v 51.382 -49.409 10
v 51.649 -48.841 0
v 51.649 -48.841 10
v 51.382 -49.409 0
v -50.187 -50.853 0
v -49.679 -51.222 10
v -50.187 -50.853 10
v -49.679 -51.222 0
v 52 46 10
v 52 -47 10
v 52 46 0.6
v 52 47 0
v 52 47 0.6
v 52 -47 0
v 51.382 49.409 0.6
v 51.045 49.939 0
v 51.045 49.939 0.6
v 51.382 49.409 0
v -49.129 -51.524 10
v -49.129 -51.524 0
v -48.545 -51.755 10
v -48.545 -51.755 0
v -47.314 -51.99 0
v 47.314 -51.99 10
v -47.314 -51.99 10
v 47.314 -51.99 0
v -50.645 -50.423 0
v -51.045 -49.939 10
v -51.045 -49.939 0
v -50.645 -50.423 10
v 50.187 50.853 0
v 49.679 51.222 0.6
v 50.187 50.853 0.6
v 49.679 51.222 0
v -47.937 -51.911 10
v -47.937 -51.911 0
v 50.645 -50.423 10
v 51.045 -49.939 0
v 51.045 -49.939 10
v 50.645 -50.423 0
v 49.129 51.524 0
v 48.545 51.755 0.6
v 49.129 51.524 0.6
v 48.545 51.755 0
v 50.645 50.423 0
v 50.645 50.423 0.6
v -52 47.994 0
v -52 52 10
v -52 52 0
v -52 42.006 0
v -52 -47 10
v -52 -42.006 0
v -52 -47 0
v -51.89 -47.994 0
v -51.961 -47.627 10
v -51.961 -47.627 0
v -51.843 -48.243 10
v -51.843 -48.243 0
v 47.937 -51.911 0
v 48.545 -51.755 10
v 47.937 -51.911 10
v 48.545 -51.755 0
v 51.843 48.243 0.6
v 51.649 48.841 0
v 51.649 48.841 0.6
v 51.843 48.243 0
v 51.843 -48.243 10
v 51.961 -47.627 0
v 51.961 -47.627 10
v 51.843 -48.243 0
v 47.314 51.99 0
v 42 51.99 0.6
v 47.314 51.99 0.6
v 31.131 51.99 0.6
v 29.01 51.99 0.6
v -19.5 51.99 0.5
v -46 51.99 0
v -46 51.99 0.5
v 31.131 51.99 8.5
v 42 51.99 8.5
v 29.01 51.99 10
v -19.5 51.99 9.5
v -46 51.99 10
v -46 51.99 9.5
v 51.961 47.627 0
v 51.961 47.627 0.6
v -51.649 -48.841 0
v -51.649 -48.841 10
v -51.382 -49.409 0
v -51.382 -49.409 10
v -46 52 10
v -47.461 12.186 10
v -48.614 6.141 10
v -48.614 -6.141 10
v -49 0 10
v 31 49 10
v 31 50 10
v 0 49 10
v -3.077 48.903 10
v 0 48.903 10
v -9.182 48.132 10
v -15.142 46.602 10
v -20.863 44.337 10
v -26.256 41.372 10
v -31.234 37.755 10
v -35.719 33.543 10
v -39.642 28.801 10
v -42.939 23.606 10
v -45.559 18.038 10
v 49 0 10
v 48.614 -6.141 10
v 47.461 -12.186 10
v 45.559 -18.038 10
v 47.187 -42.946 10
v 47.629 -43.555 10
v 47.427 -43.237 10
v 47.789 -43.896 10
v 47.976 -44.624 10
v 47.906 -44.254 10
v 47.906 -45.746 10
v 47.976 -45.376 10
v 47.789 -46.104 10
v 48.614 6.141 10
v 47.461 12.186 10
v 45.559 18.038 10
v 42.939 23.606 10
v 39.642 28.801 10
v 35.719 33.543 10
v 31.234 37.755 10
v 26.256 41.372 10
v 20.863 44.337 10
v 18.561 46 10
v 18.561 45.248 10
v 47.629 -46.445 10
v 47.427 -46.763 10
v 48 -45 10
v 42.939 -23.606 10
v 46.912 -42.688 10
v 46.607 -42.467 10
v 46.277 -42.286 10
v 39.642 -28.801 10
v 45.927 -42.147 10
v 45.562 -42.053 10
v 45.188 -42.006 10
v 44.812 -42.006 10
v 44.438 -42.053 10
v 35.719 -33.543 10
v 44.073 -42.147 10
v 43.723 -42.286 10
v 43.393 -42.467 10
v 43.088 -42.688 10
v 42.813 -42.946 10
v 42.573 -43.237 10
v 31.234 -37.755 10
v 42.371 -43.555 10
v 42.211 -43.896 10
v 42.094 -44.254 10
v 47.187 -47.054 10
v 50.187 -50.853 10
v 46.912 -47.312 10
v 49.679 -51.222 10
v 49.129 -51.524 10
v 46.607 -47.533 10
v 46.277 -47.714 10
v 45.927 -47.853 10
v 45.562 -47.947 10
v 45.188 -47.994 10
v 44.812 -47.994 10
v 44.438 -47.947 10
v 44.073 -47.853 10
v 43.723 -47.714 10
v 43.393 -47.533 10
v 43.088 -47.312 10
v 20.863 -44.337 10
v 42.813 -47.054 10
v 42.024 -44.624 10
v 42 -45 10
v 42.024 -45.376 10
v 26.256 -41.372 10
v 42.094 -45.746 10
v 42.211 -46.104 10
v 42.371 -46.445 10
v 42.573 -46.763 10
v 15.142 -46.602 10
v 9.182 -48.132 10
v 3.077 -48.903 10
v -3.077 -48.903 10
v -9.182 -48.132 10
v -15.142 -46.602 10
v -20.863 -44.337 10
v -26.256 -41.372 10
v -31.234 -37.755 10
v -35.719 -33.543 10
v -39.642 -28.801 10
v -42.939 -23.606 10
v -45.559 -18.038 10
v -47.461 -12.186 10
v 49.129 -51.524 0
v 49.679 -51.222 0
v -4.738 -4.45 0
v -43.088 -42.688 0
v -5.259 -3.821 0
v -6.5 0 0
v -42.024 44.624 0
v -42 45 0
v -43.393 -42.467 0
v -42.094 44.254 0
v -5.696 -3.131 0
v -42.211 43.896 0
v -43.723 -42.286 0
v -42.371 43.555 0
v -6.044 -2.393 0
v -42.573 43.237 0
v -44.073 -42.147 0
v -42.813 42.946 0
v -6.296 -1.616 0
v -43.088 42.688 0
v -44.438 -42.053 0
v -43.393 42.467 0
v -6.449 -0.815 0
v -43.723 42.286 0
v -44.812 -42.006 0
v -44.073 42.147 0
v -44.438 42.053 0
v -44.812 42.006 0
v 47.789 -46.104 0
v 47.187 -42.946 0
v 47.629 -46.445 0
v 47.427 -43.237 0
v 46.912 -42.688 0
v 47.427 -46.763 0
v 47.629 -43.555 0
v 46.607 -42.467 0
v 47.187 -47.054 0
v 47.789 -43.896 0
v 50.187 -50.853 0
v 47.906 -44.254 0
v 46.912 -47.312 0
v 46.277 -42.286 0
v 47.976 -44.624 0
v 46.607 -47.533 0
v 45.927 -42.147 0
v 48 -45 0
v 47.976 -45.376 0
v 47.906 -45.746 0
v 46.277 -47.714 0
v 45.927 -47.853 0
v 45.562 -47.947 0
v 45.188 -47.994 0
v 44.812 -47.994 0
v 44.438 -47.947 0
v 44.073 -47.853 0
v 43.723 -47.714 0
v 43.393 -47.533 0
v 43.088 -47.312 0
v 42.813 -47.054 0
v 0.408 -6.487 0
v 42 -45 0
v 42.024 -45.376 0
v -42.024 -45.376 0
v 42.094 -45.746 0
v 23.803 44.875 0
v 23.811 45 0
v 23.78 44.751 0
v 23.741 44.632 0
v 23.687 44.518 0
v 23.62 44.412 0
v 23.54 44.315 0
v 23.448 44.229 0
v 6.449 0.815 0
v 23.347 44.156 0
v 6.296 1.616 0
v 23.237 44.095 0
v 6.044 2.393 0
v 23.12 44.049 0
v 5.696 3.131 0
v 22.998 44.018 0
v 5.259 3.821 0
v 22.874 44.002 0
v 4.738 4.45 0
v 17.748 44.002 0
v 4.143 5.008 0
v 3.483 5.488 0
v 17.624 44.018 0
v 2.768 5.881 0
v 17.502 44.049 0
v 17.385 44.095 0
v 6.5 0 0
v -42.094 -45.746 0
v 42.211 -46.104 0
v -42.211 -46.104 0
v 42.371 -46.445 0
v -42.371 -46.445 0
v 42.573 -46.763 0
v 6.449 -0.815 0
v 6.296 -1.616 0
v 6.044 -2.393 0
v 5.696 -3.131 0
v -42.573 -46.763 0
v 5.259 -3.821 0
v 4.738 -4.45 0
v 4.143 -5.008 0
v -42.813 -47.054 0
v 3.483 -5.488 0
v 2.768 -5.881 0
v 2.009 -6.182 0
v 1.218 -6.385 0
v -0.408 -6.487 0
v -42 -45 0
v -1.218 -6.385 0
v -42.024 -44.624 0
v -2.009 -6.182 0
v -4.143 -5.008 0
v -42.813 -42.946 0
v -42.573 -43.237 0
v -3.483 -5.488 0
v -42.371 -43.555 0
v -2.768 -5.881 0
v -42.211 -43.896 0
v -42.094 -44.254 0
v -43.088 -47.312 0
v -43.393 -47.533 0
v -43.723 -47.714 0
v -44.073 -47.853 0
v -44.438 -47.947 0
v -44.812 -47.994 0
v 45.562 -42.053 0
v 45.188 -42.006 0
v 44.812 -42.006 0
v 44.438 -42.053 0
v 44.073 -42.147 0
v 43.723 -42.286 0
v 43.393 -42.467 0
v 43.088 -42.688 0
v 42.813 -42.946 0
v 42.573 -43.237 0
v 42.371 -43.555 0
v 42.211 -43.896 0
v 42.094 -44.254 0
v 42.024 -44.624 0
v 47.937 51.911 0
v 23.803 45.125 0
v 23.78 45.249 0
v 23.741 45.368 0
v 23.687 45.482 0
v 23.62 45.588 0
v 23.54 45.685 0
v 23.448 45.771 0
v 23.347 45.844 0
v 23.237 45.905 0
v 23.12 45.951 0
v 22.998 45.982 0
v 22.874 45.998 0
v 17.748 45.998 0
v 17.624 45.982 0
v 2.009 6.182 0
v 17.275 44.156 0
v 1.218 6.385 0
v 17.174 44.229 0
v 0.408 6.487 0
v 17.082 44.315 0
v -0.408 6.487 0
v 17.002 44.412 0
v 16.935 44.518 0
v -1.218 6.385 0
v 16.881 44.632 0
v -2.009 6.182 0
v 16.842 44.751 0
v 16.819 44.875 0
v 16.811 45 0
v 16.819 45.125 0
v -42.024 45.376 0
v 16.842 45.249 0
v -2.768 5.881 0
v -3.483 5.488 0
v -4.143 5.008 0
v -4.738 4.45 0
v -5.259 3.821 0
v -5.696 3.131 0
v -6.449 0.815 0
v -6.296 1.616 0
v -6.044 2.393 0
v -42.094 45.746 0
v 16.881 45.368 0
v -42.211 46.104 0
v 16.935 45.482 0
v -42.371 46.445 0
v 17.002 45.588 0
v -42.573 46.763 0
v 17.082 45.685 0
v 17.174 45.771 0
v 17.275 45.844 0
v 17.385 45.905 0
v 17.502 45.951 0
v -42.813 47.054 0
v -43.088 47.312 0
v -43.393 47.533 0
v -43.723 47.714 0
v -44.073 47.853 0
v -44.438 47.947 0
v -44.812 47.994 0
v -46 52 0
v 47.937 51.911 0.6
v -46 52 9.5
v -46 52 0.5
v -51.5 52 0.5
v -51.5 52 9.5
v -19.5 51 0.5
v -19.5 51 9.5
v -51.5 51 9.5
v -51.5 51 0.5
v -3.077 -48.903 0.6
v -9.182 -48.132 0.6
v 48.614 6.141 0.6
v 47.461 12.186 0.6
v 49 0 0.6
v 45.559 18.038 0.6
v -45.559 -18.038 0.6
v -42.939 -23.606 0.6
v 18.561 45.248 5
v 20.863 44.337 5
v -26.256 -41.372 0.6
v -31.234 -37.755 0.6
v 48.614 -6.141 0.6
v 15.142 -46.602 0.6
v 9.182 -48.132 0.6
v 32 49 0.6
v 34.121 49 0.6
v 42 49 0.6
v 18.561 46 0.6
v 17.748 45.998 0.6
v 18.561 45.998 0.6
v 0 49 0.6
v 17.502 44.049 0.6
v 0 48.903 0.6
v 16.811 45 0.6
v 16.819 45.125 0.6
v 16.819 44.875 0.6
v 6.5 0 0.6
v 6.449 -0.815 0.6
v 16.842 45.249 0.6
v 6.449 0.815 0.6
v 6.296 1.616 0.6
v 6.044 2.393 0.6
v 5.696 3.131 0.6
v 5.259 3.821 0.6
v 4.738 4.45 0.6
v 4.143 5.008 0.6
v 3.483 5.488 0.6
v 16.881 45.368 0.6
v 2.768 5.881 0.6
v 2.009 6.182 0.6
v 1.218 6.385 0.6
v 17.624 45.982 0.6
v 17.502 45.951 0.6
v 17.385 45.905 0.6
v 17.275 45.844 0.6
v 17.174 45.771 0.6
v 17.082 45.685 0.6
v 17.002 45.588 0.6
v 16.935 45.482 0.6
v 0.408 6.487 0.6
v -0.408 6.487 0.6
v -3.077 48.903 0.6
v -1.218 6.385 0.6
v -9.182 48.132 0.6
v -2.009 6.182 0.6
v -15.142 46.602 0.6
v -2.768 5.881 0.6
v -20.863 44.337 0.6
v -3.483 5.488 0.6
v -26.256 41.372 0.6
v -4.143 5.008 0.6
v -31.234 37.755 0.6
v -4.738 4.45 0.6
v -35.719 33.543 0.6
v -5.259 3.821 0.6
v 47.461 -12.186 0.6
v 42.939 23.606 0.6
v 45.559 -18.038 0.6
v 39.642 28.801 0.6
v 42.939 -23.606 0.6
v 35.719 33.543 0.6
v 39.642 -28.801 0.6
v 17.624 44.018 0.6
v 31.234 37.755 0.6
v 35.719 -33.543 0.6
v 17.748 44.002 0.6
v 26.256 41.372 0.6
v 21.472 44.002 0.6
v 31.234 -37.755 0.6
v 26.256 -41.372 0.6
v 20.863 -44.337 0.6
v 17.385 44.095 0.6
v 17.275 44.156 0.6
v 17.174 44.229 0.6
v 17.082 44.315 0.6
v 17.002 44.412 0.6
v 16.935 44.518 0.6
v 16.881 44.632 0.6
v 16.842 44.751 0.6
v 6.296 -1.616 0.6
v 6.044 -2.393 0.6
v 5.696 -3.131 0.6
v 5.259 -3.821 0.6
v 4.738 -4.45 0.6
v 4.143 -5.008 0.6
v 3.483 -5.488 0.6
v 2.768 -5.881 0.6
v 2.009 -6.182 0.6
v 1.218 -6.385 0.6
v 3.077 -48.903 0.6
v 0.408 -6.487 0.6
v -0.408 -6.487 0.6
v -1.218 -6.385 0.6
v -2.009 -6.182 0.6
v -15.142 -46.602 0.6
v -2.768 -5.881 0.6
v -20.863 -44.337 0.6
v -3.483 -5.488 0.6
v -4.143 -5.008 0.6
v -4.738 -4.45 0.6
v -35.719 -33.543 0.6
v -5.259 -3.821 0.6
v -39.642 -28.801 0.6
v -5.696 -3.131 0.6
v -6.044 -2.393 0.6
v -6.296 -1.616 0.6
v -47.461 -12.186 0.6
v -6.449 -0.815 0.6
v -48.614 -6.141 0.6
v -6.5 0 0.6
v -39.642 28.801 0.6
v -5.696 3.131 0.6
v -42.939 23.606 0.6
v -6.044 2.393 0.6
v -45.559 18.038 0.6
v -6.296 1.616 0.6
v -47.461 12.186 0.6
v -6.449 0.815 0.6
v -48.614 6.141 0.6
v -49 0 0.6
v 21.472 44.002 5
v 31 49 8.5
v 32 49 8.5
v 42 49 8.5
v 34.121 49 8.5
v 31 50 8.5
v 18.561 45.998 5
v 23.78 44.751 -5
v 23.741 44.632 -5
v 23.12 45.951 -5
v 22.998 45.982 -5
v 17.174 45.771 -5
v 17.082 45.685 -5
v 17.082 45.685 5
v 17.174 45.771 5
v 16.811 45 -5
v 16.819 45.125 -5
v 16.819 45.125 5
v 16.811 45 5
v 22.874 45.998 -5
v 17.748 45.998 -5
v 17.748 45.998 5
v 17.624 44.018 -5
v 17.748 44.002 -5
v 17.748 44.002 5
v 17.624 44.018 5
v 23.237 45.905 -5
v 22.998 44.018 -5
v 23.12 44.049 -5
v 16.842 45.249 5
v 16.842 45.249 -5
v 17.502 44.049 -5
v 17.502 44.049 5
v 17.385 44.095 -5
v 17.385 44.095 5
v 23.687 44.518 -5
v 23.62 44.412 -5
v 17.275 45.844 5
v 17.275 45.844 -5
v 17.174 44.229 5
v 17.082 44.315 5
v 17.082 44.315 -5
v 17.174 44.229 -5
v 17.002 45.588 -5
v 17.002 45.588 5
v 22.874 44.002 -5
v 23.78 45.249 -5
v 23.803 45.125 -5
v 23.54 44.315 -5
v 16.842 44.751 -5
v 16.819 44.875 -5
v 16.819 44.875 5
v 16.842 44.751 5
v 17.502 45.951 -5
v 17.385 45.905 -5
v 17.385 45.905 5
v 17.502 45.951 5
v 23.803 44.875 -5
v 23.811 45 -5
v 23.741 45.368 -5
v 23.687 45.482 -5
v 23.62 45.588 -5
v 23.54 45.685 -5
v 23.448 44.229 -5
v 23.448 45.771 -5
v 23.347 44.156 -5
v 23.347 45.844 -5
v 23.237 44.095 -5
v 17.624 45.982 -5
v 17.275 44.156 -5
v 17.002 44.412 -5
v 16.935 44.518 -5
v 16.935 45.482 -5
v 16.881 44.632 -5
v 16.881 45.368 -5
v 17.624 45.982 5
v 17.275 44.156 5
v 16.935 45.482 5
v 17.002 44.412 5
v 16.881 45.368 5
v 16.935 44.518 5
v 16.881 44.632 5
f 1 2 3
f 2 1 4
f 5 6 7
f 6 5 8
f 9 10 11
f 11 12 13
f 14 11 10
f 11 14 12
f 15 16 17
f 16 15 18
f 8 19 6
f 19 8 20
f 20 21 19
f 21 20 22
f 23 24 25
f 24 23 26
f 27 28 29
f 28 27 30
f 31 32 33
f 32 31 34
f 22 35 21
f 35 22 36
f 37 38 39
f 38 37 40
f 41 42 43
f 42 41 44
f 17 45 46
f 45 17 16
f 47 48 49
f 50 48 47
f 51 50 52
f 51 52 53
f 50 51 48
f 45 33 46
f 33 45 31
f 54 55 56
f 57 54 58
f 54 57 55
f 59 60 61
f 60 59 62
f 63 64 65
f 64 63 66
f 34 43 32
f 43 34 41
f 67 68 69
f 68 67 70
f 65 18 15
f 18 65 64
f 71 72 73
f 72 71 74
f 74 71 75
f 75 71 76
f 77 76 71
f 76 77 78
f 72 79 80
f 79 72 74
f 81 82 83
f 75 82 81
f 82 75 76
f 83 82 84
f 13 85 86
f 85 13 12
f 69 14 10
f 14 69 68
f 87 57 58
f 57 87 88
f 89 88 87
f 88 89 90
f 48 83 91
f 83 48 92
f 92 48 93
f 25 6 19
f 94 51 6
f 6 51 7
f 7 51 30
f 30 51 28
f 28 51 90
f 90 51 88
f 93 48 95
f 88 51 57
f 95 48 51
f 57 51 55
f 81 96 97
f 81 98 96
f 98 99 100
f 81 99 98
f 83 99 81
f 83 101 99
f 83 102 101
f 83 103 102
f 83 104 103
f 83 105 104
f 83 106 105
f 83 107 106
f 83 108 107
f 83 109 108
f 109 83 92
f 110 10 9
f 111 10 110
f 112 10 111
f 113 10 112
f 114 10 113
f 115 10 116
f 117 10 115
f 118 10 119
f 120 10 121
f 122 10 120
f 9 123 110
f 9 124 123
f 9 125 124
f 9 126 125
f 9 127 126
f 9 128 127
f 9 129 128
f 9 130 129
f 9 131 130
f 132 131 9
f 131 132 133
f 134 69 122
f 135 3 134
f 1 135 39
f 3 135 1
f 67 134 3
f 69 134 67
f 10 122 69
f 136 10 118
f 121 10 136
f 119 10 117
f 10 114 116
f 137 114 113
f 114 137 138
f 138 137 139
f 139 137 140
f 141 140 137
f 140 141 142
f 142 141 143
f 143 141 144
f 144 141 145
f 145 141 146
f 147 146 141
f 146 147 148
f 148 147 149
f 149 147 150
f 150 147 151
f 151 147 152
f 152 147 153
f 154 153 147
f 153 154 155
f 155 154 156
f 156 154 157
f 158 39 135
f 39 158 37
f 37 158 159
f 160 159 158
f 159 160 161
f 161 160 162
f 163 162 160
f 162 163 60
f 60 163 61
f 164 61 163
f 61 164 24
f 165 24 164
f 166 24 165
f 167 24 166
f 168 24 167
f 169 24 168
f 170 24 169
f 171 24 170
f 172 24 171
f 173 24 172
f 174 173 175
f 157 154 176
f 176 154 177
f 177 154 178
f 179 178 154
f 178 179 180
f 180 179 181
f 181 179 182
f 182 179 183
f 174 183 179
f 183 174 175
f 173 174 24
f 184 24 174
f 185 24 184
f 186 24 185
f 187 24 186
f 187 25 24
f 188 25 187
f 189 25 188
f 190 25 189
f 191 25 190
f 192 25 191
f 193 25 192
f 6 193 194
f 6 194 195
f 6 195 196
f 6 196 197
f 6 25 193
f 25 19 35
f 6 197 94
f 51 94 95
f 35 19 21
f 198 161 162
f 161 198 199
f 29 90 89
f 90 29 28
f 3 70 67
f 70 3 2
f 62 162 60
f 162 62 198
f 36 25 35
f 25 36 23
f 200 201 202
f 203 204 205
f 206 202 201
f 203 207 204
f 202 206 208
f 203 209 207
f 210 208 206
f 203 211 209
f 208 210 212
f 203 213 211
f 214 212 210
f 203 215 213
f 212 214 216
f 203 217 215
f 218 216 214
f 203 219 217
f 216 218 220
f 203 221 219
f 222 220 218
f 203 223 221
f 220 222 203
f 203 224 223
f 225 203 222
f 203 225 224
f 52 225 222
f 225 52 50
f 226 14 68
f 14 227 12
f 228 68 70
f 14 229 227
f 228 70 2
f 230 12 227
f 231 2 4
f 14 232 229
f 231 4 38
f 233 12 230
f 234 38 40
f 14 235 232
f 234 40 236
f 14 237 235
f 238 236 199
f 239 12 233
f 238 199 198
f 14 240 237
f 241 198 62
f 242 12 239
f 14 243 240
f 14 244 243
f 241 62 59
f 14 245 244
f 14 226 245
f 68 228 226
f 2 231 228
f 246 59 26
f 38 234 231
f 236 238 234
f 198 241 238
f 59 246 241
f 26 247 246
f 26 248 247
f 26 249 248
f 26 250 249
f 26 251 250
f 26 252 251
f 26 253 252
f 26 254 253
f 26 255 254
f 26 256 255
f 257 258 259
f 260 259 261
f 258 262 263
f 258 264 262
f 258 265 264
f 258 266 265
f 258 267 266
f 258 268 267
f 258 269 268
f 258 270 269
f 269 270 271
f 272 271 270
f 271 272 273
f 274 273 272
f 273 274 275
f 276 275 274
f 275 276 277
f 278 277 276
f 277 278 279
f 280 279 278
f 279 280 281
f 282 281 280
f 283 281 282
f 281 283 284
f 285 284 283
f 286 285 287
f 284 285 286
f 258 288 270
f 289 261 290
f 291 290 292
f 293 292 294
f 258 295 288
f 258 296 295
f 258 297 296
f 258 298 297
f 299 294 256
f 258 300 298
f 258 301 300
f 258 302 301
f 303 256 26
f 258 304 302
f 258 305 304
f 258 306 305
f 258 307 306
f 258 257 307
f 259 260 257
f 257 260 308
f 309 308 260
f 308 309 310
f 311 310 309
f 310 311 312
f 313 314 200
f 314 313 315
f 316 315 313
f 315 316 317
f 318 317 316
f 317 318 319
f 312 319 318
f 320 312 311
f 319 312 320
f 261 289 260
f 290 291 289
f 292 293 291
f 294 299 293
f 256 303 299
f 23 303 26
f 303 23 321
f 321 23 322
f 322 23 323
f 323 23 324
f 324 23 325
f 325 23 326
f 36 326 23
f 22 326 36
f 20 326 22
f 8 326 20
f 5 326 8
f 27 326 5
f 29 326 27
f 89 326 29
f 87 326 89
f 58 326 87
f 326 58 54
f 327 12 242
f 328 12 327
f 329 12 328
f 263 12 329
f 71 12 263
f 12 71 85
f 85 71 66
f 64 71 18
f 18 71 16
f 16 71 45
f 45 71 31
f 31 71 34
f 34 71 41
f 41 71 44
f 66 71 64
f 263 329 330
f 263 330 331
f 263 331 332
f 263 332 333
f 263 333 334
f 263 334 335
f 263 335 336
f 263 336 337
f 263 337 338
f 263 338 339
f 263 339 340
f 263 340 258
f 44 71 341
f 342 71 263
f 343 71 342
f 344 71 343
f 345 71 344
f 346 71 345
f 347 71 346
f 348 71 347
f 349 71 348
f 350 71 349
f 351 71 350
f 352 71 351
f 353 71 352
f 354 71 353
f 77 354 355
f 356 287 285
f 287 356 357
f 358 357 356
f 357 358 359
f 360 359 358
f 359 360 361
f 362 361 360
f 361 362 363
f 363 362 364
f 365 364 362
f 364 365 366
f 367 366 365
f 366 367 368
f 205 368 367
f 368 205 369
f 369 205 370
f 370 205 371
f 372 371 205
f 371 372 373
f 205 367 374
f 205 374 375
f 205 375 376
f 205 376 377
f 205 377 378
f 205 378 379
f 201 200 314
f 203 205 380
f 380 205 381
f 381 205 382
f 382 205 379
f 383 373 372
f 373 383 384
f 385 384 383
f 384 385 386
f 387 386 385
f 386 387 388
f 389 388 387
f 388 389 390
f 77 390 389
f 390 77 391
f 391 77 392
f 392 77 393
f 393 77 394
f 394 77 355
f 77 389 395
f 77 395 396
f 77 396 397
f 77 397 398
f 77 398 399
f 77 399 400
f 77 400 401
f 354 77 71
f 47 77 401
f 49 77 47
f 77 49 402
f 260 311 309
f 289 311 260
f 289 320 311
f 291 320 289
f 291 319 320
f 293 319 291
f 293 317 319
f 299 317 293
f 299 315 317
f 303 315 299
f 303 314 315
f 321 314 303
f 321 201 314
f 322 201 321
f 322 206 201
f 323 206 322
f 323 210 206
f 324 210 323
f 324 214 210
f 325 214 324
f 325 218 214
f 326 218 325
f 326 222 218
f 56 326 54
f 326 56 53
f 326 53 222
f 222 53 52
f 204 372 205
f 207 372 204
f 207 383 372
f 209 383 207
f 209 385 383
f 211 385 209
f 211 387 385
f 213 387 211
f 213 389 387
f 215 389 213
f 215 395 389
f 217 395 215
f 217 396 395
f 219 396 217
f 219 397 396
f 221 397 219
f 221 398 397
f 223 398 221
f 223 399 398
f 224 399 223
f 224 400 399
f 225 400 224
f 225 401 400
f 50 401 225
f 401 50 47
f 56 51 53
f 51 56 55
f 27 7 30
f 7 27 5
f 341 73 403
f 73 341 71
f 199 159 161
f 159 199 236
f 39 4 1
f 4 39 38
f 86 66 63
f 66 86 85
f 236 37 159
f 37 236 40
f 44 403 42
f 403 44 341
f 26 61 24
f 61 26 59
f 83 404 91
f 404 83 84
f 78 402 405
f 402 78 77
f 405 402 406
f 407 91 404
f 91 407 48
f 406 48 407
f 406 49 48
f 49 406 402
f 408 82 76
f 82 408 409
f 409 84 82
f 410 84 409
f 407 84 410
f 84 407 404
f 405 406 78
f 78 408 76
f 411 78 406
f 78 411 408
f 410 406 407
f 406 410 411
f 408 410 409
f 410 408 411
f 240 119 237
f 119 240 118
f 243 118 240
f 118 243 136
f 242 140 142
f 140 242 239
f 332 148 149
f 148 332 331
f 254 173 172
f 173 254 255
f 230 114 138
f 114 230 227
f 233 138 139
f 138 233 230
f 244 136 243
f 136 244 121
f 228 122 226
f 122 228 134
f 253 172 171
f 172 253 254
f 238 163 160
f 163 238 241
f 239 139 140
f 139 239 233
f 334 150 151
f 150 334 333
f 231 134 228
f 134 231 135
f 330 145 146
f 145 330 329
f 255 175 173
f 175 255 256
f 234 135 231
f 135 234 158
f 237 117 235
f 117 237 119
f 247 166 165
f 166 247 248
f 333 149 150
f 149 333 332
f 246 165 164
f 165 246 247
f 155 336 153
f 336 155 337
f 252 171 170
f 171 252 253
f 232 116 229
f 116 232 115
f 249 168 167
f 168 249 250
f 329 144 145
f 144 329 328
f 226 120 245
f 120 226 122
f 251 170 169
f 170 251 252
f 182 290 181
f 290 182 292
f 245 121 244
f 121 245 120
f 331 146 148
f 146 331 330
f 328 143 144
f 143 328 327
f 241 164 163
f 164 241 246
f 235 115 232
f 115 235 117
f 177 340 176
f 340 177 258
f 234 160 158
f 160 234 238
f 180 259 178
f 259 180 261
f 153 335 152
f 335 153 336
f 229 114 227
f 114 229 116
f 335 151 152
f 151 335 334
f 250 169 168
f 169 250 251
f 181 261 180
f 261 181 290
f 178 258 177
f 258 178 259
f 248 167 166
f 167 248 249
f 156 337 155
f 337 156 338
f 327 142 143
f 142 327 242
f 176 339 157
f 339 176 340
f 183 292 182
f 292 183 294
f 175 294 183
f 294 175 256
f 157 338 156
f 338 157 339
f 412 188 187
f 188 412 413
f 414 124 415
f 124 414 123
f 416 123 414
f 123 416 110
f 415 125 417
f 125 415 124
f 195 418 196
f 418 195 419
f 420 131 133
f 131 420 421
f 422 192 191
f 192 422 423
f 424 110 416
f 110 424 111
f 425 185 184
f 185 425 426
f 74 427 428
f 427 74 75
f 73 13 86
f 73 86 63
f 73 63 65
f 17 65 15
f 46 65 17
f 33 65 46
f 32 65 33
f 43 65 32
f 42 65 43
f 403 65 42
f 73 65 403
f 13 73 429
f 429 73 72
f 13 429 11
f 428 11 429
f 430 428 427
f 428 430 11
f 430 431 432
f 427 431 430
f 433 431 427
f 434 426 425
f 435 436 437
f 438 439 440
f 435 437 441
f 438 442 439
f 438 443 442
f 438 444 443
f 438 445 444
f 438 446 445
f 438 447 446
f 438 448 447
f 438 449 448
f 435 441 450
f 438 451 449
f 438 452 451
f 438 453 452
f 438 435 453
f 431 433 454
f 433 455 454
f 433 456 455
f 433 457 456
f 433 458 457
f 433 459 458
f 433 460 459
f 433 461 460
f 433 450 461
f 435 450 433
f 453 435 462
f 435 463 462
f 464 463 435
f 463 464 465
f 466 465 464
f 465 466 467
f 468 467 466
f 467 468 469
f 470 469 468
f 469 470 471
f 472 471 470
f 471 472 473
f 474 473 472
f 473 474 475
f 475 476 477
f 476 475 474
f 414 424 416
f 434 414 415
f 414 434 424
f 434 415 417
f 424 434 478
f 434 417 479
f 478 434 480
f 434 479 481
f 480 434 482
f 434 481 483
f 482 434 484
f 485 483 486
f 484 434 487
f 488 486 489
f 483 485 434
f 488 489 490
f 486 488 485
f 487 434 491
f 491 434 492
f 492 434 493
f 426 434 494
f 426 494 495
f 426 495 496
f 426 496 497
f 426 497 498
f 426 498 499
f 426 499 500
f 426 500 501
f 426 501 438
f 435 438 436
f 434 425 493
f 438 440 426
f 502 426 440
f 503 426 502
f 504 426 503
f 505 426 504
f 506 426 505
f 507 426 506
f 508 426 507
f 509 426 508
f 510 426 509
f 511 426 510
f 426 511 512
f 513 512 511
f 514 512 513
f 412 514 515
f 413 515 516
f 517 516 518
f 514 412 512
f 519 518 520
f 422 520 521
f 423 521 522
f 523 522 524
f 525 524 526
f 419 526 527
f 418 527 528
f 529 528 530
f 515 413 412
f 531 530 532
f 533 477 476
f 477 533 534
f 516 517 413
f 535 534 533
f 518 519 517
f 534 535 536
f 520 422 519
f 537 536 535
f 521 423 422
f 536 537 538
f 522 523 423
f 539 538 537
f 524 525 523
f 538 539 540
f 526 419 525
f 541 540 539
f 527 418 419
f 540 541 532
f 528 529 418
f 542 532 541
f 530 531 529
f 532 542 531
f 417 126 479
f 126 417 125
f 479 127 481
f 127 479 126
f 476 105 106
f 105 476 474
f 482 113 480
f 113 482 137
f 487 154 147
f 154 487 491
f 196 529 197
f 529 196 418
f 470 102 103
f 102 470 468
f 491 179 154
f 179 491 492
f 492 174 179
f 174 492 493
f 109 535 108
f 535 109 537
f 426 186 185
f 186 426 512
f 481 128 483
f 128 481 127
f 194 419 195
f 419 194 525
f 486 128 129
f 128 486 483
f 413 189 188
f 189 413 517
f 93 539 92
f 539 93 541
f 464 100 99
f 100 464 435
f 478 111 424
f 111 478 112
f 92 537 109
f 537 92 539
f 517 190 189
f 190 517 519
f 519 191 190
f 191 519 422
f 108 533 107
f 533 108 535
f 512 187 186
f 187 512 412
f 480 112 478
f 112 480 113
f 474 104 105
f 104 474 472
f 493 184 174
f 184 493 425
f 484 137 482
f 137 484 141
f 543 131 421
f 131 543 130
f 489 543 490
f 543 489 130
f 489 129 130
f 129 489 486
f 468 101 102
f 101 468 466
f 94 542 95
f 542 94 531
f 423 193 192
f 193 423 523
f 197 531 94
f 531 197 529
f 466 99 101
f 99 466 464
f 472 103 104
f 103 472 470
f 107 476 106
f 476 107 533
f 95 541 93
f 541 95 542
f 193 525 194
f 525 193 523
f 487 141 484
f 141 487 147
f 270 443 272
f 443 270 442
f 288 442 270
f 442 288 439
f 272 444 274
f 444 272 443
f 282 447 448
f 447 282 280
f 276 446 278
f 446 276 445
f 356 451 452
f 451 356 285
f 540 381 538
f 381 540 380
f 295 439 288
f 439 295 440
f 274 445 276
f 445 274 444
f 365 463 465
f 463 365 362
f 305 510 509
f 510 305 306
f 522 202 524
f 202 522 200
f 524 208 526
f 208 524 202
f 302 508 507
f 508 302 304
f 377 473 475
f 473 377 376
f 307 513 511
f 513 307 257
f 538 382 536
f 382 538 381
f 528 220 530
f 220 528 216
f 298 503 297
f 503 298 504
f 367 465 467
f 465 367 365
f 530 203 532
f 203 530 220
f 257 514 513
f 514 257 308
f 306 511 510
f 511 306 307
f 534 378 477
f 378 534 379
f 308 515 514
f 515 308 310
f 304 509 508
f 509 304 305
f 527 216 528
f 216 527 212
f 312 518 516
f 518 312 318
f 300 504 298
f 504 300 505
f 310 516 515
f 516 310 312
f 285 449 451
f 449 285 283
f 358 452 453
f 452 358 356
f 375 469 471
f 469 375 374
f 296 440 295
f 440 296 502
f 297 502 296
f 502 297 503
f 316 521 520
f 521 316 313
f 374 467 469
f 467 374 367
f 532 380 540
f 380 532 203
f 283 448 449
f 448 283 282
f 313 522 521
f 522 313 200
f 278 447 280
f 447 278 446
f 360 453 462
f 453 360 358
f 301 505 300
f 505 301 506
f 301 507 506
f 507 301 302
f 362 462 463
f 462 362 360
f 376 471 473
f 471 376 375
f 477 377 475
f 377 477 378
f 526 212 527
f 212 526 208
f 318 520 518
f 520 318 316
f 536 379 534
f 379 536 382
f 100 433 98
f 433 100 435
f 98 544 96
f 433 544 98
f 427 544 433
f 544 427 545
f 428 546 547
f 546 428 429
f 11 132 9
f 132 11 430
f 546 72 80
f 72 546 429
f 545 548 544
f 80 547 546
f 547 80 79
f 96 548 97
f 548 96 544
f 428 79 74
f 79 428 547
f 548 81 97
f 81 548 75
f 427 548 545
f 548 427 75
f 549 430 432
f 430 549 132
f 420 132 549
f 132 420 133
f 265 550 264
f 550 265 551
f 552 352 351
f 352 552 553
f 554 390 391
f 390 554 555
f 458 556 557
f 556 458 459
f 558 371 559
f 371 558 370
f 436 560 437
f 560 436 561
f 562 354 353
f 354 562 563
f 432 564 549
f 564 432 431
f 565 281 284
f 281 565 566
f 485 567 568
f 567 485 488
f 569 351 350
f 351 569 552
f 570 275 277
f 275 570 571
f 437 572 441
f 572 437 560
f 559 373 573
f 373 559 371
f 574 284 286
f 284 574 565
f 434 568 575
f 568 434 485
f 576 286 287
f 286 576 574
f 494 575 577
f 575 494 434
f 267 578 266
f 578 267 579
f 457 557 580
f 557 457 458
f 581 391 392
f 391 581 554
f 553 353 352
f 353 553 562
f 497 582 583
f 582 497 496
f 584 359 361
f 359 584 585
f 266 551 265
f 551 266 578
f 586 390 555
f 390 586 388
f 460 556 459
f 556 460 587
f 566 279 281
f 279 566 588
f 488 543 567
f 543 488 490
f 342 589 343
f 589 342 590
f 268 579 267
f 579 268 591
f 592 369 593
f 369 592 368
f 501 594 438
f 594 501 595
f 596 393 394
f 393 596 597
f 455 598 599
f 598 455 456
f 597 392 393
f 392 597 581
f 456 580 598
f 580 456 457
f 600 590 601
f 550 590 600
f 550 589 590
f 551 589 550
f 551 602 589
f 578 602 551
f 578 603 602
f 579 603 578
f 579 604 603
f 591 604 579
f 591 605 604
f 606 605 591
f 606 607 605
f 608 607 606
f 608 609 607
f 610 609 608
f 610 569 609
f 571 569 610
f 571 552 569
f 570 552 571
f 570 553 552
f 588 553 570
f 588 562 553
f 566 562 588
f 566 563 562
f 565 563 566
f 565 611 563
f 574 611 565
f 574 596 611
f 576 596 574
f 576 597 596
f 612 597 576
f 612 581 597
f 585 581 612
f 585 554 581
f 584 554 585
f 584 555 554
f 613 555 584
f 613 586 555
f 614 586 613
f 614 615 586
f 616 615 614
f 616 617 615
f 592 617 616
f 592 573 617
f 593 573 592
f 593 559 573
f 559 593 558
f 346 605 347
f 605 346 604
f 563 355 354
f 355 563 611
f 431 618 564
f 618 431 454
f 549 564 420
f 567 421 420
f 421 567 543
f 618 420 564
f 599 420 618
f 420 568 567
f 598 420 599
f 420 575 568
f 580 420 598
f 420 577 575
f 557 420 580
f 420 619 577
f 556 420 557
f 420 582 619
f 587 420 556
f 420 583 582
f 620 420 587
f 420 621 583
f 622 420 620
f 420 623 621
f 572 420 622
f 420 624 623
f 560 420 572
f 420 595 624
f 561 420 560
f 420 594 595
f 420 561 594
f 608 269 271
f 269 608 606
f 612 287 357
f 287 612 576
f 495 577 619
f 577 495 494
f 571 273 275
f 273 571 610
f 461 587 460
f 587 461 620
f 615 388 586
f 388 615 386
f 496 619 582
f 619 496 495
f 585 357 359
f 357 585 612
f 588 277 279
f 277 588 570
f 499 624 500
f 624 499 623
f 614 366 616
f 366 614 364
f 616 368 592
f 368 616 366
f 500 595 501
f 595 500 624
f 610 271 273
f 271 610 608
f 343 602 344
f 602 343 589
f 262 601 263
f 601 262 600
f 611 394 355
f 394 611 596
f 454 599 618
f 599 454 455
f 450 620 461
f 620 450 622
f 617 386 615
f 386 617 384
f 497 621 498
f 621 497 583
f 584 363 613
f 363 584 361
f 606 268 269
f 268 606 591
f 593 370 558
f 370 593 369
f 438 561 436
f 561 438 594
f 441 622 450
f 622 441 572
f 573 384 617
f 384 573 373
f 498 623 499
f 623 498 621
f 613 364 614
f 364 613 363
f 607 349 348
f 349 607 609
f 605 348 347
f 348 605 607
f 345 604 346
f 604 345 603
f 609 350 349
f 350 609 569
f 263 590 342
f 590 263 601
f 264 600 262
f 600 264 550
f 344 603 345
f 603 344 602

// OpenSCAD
$fn = 50;


union() {
	difference() {
		union() {
			hull() {
				translate(v = [-47.0000000000, 47.0000000000, 0]) {
					cylinder(h = 10, r = 5);
				}
				translate(v = [47.0000000000, 47.0000000000, 0]) {
					cylinder(h = 10, r = 5);
				}
				translate(v = [-47.0000000000, -47.0000000000, 0]) {
					cylinder(h = 10, r = 5);
				}
				translate(v = [47.0000000000, -47.0000000000, 0]) {
					cylinder(h = 10, r = 5);
				}
			}
			translate(v = [-52.0000000000, 46.0000000000, 0]) {
				cube(size = [6, 6, 10]);
			}
		}
		union() {
			translate(v = [-52.5000000000, -45.0000000000, -250.0000000000]) {
				rotate(a = [0, 0, 0]) {
					difference() {
						union() {
							hull() {
								translate(v = [7.5000000000, 0, 0]) {
									cylinder(h = 250, r = 3.0000000000, r1 = 3.0000000000, r2 = 3.0000000000);
								}
								translate(v = [-7.5000000000, 0, 0]) {
									cylinder(h = 250, r = 3.0000000000, r1 = 3.0000000000, r2 = 3.0000000000);
								}
							}
						}
						union();
					}
				}
			}
			translate(v = [-52.5000000000, 45.0000000000, -250.0000000000]) {
				rotate(a = [0, 0, 0]) {
					difference() {
						union() {
							hull() {
								translate(v = [7.5000000000, 0, 0]) {
									cylinder(h = 250, r = 3.0000000000, r1 = 3.0000000000, r2 = 3.0000000000);
								}
								translate(v = [-7.5000000000, 0, 0]) {
									cylinder(h = 250, r = 3.0000000000, r1 = 3.0000000000, r2 = 3.0000000000);
								}
							}
						}
						union();
					}
				}
			}
			translate(v = [-51.5000000000, 51.0000000000, 0.5000000000]) {
				cube(size = [32, 1, 9.0000000000]);
			}
			translate(v = [45.0000000000, -45.0000000000, 0]) {
				cylinder(h = 100, r = 3.0000000000);
			}
			translate(v = [0, 0, 0.6000000000]) {
				cylinder(h = 12.4000000000, r = 49.0000000000);
			}
			translate(v = [0, 0, -5.0000000000]) {
				cylinder(h = 10, r = 6.5000000000);
			}
			translate(v = [0.0000000000, 46.0000000000, 0.6000000000]) {
				cube(size = [52.0000000000, 3, 12.4000000000]);
			}
			translate(v = [42.0000000000, 46.0000000000, 0.6000000000]) {
				cube(size = [10, 6, 12.4000000000]);
			}
			translate(v = [31.0000000000, 46.0000000000, 8.5000000000]) {
				cube(size = [21, 6, 1.5000000000]);
			}
			translate(v = [28.2500000000, 52.7500000000, 0.6000000000]) {
				rotate(a = [0, 0, -45]) {
					cube(size = [7.5000000000, 1.5000000000, 12.4000000000]);
				}
			}
			translate(v = [11.0610000000, 44.0000000000, 0.6000000000]) {
				cube(size = [7.5000000000, 2, 9.4000000000]);
			}
		}
	}
	union() {
		translate(v = [20.3110000000, 45.0000000000, -5.0000000000]) {
			rotate(a = [0, 0, 0]) {
				difference() {
					union() {
						#hull() {
							#translate(v = [2.5000000000, 0, 0]) {
								cylinder(h = 10, r = 1.0000000000, r1 = 1.0000000000, r2 = 1.0000000000);
							}
							#translate(v = [-2.5000000000, 0, 0]) {
								cylinder(h = 10, r = 1.0000000000, r1 = 1.0000000000, r2 = 1.0000000000);
							}
						}
					}
					union();
				}
			}
		}
	}
}
